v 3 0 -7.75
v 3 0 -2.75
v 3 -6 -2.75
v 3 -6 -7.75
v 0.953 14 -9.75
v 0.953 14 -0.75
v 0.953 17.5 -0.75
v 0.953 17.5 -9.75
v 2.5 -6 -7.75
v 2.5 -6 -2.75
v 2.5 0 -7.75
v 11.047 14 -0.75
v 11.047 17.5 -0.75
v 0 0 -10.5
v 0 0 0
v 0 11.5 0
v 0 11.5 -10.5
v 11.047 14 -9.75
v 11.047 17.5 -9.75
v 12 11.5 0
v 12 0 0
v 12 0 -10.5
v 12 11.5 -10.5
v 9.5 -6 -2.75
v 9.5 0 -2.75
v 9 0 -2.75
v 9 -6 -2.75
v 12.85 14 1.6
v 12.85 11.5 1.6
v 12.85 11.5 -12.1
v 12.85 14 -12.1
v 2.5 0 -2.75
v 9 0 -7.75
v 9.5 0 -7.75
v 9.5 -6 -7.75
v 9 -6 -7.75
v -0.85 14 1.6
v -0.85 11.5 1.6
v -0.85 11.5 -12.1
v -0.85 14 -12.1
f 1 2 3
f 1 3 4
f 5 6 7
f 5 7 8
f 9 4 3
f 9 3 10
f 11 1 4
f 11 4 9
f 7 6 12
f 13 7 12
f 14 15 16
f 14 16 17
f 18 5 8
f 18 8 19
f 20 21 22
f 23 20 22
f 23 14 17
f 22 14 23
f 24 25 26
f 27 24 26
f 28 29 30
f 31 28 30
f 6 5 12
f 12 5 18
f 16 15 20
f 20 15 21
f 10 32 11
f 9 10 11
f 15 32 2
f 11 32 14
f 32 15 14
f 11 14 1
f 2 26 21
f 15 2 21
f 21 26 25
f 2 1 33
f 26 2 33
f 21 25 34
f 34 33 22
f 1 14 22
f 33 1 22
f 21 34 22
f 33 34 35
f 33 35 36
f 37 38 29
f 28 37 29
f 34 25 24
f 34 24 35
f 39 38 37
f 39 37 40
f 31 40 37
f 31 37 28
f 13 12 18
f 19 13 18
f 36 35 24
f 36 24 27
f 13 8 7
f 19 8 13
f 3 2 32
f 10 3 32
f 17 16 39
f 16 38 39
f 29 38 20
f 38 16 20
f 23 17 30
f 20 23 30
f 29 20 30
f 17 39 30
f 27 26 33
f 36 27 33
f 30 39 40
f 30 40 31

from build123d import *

# Parameters (mm, degrees)
SKETCH_1_W      = 12
SKETCH_1_H      = 10.5
EXTRUDE_1_DEPTH = 11.5
SKETCH_2_W      = 13.7
SKETCH_2_H      = 13.7
EXTRUDE_2_DEPTH = 2.5
SKETCH_3_W      = 10.093154374
SKETCH_3_H      = 9
EXTRUDE_3_DEPTH = 3.5
SKETCH_4_W      = 0.5
SKETCH_4_H      = 5
EXTRUDE_4_DEPTH = 6


with BuildPart() as part:
    # Эскиз1 → Бобышка-Вытянуть1 (new body)
    with BuildSketch(Plane(origin=(0, 0, 0), x_dir=(1, 0, 0), z_dir=(0, 1, 0))):
        with Locations((6, 5.25)):
            Rectangle(SKETCH_1_W, SKETCH_1_H)
    extrude(amount=EXTRUDE_1_DEPTH)

    # Эскиз2 → Бобышка-Вытянуть2 (add)
    with BuildSketch(Plane(origin=(0, 11.5, 0), x_dir=(1, 0, 0), z_dir=(0, 1, 0))):
        with Locations((6, 5.25)):
            Rectangle(SKETCH_2_W, SKETCH_2_H)
    extrude(amount=EXTRUDE_2_DEPTH)

    # Эскиз4 → Бобышка-Вытянуть4 (add)
    with BuildSketch(Plane(origin=(0, 0, 0), x_dir=(-1, 0, 0), z_dir=(0, -1, 0))):
        with Locations((-2.75, 5.25)):
            Rectangle(SKETCH_4_W, SKETCH_4_H)
        with Locations((-9.25, 5.25)):
            Rectangle(SKETCH_4_W, SKETCH_4_H)
    extrude(amount=EXTRUDE_4_DEPTH)


with BuildPart() as body_2:
    # Эскиз3 → Бобышка-Вытянуть3 (new body)
    with BuildSketch(Plane(origin=(0, 14, 0), x_dir=(1, 0, 0), z_dir=(0, 1, 0))):
        with Locations((6, 5.25)):
            Rectangle(SKETCH_3_W, SKETCH_3_H)
    extrude(amount=EXTRUDE_3_DEPTH)


solid = Compound([part.part, body_2.part])
